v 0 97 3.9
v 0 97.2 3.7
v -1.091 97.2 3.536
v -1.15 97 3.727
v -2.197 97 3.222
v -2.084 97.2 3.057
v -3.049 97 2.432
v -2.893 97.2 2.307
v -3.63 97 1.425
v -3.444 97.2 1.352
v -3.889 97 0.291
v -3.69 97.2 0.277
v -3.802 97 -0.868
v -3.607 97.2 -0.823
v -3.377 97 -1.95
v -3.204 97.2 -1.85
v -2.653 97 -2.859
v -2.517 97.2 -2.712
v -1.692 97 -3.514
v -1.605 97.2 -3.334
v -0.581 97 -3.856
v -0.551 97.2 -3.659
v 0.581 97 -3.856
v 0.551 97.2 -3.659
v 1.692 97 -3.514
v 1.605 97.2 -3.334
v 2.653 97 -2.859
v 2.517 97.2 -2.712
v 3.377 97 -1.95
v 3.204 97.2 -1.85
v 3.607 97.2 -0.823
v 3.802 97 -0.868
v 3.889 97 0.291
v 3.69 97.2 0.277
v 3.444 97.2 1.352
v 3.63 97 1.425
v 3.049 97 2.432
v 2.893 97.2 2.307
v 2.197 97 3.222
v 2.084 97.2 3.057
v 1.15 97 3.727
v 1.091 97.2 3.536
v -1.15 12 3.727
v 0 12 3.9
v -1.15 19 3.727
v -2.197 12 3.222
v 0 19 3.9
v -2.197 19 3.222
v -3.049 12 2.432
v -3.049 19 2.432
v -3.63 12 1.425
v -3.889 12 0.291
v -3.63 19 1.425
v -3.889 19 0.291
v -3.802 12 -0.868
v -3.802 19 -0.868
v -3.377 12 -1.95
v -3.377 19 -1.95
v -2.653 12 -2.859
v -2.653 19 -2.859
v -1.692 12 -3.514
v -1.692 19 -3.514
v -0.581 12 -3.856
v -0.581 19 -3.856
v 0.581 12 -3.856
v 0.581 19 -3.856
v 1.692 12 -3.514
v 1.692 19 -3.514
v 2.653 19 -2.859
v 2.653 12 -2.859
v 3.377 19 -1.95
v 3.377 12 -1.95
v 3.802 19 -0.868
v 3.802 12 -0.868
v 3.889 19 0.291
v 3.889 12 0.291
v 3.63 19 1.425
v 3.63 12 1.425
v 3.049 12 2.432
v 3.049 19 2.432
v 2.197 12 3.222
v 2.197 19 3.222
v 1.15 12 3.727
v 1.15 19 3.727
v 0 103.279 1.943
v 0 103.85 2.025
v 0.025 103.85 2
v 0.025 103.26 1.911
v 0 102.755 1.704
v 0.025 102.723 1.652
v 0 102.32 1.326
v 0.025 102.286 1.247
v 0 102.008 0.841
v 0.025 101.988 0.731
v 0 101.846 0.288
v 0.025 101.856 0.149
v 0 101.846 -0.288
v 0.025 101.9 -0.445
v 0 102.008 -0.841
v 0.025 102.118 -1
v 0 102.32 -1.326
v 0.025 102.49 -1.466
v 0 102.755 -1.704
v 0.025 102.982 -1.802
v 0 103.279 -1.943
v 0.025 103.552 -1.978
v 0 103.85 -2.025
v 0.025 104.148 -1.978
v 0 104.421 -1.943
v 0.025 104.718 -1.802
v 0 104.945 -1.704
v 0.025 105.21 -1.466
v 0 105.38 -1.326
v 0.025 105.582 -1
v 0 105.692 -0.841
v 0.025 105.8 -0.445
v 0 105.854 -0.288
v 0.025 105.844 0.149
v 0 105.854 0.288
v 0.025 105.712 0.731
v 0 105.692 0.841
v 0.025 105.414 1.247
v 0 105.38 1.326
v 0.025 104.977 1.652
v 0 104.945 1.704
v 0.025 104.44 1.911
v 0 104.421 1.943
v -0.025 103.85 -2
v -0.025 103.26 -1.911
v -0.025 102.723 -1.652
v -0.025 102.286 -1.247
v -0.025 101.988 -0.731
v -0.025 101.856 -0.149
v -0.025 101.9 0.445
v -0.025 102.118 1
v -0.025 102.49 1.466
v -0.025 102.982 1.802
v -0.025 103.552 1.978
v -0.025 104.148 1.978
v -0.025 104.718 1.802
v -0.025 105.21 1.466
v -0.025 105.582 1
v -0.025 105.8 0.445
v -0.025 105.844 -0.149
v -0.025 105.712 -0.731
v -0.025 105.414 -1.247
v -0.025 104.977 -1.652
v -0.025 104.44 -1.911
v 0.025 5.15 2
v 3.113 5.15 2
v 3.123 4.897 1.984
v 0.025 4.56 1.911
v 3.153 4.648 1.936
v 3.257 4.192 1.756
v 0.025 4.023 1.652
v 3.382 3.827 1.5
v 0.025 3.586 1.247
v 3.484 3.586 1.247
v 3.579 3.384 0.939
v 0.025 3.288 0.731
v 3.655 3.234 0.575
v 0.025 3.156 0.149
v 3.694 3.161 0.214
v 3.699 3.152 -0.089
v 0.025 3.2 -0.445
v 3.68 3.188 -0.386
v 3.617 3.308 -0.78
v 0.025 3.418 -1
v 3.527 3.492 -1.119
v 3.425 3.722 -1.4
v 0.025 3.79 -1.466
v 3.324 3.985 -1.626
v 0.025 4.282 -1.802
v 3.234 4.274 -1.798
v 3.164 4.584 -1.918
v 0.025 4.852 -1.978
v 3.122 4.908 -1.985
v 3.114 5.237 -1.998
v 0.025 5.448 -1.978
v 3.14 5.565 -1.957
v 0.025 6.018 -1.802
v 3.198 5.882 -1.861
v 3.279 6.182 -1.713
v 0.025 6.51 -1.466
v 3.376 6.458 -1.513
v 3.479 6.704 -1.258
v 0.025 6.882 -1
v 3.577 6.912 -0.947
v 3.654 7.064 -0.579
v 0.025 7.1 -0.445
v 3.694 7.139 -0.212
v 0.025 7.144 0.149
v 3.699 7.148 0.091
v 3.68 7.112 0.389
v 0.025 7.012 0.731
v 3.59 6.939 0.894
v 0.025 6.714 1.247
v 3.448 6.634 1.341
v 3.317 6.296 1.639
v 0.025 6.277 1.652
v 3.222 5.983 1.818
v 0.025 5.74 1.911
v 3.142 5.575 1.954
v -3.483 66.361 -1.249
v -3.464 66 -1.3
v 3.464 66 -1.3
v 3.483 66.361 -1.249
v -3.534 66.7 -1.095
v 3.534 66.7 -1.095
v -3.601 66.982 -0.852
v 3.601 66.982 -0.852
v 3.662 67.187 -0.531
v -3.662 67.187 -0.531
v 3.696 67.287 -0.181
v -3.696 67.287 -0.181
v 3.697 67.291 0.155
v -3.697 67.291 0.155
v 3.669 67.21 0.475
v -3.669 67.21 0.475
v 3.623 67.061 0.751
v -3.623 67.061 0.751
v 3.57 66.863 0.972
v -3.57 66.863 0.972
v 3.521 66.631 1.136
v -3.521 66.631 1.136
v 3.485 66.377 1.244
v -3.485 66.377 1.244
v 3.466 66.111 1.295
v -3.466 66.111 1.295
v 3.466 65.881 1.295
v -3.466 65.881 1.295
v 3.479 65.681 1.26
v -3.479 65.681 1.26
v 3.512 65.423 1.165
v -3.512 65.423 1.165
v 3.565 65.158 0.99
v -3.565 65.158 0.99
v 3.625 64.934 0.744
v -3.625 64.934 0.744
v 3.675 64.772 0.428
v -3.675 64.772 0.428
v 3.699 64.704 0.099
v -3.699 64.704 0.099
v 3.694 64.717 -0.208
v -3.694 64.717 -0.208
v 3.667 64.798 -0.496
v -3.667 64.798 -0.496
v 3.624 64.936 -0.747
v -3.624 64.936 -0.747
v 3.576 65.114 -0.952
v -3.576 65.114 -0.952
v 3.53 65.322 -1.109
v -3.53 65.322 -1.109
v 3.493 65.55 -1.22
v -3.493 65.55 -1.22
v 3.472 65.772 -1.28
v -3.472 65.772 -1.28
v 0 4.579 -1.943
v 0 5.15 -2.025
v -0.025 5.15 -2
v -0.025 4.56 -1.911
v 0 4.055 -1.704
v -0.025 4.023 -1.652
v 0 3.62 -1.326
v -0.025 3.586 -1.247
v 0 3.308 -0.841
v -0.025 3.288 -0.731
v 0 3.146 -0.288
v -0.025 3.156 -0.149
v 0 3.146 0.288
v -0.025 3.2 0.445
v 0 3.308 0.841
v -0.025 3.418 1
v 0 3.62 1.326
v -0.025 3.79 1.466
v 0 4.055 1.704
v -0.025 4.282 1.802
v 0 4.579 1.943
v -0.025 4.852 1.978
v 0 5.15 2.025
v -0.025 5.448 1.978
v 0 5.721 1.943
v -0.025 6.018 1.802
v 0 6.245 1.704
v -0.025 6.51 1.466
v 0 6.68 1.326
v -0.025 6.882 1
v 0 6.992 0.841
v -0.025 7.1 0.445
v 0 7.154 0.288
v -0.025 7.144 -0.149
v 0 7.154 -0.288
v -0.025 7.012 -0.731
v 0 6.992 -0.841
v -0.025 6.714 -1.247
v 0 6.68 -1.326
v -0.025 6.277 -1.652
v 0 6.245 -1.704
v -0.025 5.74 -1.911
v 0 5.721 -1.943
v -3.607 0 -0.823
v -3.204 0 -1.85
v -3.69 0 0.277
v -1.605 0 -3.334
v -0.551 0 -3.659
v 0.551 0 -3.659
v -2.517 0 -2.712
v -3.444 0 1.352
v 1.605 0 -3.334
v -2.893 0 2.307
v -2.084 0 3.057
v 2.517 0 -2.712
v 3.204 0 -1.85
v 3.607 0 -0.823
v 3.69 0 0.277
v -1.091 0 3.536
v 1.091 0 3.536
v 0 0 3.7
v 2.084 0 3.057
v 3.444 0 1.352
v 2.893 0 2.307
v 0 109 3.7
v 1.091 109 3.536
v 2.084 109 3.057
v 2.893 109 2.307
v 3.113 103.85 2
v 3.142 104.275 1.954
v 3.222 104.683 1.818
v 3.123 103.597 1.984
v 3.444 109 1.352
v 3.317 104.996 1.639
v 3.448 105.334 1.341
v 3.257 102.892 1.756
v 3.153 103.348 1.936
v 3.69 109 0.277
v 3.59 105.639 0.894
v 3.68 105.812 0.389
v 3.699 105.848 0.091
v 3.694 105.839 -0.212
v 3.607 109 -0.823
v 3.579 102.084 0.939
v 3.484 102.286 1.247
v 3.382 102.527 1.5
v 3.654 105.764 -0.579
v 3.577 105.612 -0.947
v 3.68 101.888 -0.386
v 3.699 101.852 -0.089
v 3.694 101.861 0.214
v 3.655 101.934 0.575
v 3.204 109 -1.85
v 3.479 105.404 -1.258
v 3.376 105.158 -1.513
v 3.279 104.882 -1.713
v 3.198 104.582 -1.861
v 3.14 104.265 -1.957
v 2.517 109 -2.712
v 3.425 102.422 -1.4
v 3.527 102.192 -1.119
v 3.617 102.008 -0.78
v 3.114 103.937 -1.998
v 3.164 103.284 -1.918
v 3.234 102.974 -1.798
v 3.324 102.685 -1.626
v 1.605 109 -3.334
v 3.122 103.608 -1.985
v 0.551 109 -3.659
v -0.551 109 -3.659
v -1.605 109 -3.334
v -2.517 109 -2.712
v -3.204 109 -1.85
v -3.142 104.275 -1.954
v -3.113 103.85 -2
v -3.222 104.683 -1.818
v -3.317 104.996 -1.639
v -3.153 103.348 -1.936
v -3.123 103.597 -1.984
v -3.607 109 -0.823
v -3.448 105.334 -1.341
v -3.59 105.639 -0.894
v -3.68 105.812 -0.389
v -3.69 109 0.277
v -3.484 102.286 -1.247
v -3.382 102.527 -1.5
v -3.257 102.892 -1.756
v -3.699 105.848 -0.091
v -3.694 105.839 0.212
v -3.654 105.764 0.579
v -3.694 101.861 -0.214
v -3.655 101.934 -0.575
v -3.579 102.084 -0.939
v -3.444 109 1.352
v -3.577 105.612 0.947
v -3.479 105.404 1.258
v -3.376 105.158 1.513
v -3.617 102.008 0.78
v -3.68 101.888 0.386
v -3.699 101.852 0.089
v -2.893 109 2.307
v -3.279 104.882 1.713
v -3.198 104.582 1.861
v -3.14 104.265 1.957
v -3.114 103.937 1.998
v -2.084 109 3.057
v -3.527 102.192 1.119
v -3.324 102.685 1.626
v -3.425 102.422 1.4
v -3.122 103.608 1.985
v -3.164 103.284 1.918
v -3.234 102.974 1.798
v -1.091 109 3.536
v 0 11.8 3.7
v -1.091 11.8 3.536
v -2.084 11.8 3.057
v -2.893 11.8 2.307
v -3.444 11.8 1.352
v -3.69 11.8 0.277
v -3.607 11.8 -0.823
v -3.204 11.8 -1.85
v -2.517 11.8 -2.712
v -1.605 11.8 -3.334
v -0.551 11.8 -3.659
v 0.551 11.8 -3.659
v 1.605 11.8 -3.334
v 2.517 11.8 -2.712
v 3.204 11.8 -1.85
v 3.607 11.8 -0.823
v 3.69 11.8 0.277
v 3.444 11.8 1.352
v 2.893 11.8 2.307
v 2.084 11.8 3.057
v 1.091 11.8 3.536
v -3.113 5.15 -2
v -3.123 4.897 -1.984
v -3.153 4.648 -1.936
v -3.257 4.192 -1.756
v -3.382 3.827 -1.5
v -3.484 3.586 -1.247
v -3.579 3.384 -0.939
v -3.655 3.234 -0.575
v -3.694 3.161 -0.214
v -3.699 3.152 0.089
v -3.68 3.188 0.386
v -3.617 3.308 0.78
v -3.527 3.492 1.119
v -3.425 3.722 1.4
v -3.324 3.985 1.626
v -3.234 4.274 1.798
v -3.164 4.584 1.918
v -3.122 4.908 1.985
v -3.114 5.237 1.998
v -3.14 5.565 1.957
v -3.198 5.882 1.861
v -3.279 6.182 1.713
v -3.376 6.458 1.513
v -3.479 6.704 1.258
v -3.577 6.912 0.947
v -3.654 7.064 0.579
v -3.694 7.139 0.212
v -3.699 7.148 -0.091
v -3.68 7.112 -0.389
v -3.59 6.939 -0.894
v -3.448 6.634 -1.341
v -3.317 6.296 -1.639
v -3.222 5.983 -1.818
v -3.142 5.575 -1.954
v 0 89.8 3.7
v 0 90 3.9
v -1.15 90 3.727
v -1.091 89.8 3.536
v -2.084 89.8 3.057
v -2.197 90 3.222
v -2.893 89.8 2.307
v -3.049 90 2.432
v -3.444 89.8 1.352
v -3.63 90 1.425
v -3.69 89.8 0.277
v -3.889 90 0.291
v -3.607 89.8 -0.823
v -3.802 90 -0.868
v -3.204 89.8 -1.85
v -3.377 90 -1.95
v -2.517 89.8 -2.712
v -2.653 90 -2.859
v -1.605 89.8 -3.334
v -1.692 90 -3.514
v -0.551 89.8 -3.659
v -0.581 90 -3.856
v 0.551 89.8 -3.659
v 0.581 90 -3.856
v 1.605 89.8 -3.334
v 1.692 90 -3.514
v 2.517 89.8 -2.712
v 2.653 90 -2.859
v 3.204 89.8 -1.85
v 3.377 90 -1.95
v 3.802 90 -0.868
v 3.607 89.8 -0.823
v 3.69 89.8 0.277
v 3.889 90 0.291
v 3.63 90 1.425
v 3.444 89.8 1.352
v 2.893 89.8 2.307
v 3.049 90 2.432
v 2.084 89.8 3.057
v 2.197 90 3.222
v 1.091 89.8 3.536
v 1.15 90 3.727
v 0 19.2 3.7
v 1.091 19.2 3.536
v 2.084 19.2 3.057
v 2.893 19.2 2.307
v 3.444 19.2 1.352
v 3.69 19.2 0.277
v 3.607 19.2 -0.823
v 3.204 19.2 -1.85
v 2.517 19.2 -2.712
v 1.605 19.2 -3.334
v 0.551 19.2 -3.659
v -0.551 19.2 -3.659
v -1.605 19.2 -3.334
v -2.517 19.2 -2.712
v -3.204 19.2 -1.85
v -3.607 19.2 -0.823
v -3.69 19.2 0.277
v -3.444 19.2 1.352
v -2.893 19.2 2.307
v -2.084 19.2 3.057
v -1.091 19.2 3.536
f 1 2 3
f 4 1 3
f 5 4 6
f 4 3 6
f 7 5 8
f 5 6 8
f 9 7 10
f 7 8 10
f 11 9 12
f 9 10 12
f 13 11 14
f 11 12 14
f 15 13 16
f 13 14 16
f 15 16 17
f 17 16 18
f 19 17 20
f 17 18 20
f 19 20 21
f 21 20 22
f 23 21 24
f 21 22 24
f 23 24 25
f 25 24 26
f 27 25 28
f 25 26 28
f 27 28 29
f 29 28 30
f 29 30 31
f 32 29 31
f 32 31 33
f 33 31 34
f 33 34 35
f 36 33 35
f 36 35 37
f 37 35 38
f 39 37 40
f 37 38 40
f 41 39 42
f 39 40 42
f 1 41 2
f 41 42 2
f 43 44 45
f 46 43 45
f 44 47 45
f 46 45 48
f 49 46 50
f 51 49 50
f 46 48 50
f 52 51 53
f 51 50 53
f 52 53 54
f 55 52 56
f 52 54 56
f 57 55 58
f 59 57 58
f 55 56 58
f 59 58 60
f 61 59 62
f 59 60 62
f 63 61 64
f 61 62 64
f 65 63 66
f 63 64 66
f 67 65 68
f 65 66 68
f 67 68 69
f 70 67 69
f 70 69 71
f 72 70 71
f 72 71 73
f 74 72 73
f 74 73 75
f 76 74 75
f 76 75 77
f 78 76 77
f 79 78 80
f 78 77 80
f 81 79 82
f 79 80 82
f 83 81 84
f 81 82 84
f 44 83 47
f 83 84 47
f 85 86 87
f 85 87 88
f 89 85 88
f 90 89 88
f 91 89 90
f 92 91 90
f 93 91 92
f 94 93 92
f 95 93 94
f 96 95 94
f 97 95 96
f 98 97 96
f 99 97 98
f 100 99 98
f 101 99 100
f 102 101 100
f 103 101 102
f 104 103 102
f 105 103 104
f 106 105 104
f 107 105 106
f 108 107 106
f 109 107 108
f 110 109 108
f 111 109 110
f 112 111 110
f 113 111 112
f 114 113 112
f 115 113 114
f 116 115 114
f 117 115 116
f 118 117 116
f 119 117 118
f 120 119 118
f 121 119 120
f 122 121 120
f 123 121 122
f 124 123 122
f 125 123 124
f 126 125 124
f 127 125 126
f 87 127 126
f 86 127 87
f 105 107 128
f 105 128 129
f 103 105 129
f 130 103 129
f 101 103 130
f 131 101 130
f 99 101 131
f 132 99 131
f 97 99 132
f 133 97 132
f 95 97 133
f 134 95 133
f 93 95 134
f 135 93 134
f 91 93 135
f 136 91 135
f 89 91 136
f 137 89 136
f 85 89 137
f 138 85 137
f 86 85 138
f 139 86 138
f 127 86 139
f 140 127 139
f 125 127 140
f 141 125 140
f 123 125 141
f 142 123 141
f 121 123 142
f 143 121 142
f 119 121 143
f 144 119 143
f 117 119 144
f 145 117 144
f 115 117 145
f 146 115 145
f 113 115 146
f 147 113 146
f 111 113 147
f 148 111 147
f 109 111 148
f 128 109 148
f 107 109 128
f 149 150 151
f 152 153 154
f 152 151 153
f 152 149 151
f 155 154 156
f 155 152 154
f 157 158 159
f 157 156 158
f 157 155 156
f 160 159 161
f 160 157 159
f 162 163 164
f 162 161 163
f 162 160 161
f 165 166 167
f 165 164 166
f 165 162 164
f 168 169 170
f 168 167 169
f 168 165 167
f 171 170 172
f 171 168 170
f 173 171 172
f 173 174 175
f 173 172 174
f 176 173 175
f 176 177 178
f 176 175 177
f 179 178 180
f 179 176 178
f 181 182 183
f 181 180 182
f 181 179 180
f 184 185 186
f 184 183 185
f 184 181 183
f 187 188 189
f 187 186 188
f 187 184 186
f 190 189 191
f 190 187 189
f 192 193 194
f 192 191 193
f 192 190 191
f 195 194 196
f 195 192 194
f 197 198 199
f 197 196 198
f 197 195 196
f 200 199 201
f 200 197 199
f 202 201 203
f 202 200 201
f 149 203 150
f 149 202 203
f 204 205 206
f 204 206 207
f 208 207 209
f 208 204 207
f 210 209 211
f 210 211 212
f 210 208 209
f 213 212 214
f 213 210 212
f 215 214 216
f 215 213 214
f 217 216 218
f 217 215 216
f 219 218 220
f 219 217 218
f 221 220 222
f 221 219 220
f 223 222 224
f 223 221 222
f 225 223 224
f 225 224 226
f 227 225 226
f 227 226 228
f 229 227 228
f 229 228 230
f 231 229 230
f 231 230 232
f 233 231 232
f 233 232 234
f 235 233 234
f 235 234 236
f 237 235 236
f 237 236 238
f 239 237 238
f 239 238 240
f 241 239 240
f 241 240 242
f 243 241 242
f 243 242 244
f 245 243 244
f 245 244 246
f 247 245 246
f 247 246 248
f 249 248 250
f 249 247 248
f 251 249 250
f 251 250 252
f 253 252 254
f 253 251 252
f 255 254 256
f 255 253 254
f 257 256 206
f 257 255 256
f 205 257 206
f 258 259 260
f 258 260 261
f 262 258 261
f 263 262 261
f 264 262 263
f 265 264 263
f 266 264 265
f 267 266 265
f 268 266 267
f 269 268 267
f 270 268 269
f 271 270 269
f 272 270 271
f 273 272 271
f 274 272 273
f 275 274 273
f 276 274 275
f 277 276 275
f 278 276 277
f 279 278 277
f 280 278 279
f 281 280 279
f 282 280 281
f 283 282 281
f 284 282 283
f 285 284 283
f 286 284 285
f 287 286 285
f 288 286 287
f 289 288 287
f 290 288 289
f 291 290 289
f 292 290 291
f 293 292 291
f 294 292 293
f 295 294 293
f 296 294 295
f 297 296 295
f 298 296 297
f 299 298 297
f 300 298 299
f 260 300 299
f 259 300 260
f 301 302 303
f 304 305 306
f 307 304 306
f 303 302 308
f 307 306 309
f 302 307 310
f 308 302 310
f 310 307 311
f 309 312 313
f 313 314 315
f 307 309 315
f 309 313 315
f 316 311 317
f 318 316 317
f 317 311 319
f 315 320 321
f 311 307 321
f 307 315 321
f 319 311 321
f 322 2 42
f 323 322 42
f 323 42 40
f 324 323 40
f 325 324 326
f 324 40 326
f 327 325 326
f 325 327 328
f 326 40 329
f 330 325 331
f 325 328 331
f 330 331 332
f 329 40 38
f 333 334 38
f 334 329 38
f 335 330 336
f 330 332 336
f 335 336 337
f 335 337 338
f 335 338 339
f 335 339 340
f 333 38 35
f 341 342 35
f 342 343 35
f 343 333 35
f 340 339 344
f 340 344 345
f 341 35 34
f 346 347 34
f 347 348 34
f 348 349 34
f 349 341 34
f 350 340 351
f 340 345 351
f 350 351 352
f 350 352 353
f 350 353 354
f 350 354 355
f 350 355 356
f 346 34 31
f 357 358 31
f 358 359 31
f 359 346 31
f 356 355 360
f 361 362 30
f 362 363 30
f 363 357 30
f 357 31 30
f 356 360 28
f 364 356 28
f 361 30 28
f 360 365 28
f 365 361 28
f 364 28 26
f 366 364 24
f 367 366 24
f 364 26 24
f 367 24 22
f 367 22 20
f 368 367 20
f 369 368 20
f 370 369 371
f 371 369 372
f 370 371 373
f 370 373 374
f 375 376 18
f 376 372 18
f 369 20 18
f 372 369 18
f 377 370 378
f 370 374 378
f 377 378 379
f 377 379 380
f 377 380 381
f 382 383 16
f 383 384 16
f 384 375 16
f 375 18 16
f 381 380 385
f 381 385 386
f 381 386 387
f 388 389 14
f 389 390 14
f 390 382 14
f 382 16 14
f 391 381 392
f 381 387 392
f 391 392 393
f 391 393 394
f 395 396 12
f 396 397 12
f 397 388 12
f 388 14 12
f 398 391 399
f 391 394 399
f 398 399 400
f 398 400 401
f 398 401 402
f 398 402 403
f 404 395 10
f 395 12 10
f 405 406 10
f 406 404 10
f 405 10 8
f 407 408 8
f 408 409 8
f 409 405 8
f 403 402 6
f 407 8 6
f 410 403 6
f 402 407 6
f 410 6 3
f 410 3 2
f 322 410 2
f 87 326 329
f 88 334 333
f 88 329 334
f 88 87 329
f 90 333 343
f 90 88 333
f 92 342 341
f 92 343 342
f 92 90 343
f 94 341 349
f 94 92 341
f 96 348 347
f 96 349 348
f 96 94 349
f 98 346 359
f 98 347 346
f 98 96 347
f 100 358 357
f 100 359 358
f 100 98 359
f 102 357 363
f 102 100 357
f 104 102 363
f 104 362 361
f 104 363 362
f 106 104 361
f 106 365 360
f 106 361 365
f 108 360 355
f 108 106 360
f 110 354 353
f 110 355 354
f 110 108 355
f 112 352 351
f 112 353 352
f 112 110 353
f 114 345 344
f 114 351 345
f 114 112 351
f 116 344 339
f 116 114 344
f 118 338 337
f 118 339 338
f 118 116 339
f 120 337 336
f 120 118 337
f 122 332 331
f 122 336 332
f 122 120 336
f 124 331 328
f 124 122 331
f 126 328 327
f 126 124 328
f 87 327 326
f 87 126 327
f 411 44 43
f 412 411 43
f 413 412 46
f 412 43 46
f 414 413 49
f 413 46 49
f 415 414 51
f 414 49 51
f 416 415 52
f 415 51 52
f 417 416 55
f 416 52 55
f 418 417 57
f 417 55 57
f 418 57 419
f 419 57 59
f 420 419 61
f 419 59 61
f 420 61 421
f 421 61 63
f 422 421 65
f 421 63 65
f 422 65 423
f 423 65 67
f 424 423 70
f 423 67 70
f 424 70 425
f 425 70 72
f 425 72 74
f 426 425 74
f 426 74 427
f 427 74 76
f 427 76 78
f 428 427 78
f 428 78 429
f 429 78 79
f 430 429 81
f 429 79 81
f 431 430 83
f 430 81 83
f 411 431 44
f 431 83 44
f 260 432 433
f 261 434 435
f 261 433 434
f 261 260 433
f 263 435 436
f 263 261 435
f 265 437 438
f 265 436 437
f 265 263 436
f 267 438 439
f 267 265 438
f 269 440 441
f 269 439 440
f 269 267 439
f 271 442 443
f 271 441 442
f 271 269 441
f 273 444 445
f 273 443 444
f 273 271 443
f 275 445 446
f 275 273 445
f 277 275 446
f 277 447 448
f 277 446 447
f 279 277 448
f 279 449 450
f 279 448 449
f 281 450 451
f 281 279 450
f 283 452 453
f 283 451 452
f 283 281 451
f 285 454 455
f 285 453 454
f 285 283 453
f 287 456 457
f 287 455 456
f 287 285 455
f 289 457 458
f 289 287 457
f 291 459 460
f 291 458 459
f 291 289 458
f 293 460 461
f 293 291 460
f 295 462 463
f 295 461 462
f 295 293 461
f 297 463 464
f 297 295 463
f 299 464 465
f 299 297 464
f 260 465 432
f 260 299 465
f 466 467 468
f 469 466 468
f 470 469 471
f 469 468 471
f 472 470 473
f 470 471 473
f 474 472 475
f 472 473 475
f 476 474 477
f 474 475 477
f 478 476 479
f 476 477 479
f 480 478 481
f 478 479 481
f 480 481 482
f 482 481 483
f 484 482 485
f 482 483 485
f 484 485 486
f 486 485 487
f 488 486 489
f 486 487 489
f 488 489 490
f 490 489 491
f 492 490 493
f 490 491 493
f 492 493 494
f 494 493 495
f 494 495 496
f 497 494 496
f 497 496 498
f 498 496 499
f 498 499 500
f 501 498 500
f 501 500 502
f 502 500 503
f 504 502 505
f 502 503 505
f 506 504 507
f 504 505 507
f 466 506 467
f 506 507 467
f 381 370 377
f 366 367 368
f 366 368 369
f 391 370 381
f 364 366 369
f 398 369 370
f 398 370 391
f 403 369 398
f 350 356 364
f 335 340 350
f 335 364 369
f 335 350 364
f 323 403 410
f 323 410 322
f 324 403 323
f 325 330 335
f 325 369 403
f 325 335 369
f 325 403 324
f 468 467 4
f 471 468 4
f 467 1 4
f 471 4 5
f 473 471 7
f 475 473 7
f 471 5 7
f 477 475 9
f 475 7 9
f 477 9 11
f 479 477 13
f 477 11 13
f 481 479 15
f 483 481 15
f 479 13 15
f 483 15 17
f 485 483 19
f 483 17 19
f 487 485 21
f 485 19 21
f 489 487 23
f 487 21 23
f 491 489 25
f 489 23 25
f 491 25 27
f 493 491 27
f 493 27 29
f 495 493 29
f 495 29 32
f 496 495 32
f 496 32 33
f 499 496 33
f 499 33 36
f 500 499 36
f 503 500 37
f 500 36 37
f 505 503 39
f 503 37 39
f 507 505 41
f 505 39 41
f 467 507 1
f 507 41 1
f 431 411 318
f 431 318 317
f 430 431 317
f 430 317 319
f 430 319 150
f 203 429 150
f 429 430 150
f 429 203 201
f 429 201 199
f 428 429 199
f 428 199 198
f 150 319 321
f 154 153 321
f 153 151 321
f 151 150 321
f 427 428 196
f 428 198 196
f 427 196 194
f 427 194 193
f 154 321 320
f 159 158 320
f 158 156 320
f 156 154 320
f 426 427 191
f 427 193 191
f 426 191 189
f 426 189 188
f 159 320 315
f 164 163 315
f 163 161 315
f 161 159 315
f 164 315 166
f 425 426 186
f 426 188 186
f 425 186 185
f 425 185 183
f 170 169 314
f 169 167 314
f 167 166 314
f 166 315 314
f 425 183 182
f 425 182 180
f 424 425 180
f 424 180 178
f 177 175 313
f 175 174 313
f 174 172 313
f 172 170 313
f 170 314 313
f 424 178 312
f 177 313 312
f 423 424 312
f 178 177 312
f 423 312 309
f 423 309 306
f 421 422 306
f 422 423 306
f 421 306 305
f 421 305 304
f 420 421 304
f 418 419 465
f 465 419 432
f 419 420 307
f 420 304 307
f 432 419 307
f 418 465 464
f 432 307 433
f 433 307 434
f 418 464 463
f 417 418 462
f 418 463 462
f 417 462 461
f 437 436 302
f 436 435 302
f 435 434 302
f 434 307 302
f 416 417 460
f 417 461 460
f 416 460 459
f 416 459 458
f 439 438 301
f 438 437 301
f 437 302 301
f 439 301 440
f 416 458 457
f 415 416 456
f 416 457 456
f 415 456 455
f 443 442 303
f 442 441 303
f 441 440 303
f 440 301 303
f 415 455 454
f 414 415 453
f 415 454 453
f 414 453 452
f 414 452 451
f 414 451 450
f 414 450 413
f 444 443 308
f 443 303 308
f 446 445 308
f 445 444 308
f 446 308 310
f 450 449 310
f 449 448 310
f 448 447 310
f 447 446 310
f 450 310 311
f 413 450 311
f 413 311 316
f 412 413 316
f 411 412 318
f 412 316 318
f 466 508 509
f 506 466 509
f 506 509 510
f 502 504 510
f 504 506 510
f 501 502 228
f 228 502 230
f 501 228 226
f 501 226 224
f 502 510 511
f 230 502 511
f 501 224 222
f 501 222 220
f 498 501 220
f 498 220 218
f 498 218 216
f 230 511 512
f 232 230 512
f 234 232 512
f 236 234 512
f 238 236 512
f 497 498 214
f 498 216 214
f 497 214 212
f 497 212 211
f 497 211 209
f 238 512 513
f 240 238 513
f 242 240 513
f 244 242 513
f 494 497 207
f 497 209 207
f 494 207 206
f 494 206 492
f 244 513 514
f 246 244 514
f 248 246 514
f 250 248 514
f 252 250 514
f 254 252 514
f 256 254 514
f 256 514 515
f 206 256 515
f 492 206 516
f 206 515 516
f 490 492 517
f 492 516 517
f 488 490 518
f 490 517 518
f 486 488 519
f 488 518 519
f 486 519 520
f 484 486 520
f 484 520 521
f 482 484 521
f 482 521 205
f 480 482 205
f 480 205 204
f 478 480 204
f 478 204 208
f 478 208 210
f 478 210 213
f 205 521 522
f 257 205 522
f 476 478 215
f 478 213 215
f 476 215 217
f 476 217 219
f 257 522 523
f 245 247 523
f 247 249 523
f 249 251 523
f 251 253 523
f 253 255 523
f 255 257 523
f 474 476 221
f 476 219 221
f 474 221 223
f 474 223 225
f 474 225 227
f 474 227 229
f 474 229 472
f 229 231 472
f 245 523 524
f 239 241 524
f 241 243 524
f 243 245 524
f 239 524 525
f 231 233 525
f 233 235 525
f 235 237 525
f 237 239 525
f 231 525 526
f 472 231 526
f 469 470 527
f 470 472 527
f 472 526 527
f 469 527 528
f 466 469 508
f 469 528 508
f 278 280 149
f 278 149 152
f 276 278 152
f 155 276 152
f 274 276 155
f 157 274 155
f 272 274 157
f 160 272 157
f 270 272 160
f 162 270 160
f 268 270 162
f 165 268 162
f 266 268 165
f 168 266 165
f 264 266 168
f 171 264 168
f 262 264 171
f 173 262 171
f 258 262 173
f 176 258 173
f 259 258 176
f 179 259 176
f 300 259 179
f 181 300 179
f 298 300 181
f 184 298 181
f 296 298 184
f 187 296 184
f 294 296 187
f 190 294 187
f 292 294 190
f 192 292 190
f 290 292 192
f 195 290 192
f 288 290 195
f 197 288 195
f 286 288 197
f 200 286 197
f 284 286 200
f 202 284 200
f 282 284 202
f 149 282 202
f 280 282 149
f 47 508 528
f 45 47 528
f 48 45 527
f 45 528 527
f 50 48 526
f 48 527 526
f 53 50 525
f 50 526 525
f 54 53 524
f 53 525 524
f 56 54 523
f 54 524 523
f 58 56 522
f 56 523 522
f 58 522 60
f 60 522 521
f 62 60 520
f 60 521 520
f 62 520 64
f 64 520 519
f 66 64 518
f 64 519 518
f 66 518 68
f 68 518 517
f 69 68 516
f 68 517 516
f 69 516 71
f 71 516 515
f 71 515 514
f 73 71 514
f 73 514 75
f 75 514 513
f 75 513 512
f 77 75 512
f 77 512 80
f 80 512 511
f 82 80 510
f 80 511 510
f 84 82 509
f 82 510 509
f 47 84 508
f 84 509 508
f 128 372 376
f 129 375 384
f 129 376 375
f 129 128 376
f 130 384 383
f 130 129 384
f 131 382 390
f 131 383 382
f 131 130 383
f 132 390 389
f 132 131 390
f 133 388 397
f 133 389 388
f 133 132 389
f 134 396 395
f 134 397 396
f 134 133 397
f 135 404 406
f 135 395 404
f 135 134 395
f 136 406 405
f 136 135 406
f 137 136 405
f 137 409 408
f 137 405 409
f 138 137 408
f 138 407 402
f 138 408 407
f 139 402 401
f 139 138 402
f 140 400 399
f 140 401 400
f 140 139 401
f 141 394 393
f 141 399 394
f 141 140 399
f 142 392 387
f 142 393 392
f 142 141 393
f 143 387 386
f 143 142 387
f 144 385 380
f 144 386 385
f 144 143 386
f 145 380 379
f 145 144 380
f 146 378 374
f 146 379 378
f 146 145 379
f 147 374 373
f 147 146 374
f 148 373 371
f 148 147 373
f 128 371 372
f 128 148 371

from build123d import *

# Parameters (mm, degrees)
SKETCH1_R                      = 3.7
BOSS_EXTRUDE1_DEPTH            = 109
F_4_0MM_DOWEL_HOLE1_AT_2_COUNT = 2
F_4_0MM_DOWEL_HOLE1_AT_2_PITCH = 98.7
F_4_0MM_DOWEL_HOLE2_AT_2_COUNT = 2
F_4_0MM_DOWEL_HOLE2_AT_2_PITCH = 98.7
SKETCH7_W                      = 0.2
SKETCH7_H                      = 7
CHAMFER1_SIZE                  = 0.2
CUT_EXTRUDE2_DEPTH             = 110.139452178
CUT_EXTRUDE2_DEPTH_BACK        = 110.139452178
SKETCH8_R                      = 1.3


with BuildPart() as part:
    # Sketch1 → Boss-Extrude1 (new body)
    with BuildSketch(Plane(origin=(0, 0, 0), x_dir=(1, 0, 0), z_dir=(0, 1, 0))):
        with Locations(Location((0, 0, 0), (0, 0, 270))):
            Circle(SKETCH1_R)
    extrude(amount=BOSS_EXTRUDE1_DEPTH)

    # Sketch4 → Ø4.0mm Dowel Hole1 (revolve, cut)
    with BuildSketch(Plane(origin=(0, 5.15, 0), x_dir=(0, 0, -1), z_dir=(0, 1, 0))):
        Polygon((0, 0), (0, 3.7), (2, 3.7), (2, 0.025), (2.025, 0), align=None)
    f_4_0mm_dowel_hole1 = revolve(axis=Axis((6.35, 5.15, 0), (-1, 0, 0)), mode=Mode.SUBTRACT)

    # Ø4.0mm Dowel Hole1 at 2: Ø4.0mm Dowel Hole1 ×2
    with Locations(*[(0, i * F_4_0MM_DOWEL_HOLE1_AT_2_PITCH, 0) for i in range(1, F_4_0MM_DOWEL_HOLE1_AT_2_COUNT)]):
        add(f_4_0mm_dowel_hole1, mode=Mode.SUBTRACT)

    # Sketch6 → Ø4.0mm Dowel Hole2 (revolve, cut)
    with BuildSketch(Plane.ZX.offset(103.85)):
        Polygon((0, 0), (0, 3.7), (2, 3.7), (2, 0.025), (2.025, 0), align=None)
    f_4_0mm_dowel_hole2 = revolve(axis=Axis((-6.35, 103.85, 0), (1, 0, 0)), mode=Mode.SUBTRACT)

    # Ø4.0mm Dowel Hole2 at 2: Ø4.0mm Dowel Hole2 ×2
    with Locations(*[(0, -i * F_4_0MM_DOWEL_HOLE2_AT_2_PITCH, 0) for i in range(1, F_4_0MM_DOWEL_HOLE2_AT_2_COUNT)]):
        add(f_4_0mm_dowel_hole2, mode=Mode.SUBTRACT)

    # Sketch7 → Revolve1 (revolve)
    with BuildSketch(Plane(origin=(0, 0, 0), x_dir=(0, 0, -1), z_dir=(1, 0, 0)), mode=Mode.PRIVATE) as revolve1_sk:
        with Locations((3.8, 93.5)):
            Rectangle(SKETCH7_W, SKETCH7_H)
        with Locations((3.8, 15.5)):
            Rectangle(SKETCH7_W, SKETCH7_H)
    revolve(revolve1_sk.sketch.rotate(Axis((0, 99.222233113, 0), (0, -1, 0)), 180), axis=Axis((0, 99.222233113, 0), (0, -1, 0)))

    # Chamfer1
    chamfer1_edges = [part.edges().sort_by_distance(p)[0] for p in [
        (0, 97, -3.7),
        (0, 90, -3.7),
        (0, 19, -3.7),
        (0, 12, -3.7),
    ]]
    chamfer(chamfer1_edges, length=CHAMFER1_SIZE - 0.0001)  # a hair under: the kernel refuses the full size

    # Sketch8 → Cut-Extrude2 (cut, two sides: drawn at the far end of the back side and taken through both)
    with BuildSketch(Plane(origin=(0, 0, 0), x_dir=(0, 0, -1), z_dir=(1, 0, 0)).offset(-CUT_EXTRUDE2_DEPTH_BACK)):
        with Locations((0, 66)):
            Circle(SKETCH8_R)
    extrude(amount=CUT_EXTRUDE2_DEPTH + CUT_EXTRUDE2_DEPTH_BACK, mode=Mode.SUBTRACT)


solid = part.part
